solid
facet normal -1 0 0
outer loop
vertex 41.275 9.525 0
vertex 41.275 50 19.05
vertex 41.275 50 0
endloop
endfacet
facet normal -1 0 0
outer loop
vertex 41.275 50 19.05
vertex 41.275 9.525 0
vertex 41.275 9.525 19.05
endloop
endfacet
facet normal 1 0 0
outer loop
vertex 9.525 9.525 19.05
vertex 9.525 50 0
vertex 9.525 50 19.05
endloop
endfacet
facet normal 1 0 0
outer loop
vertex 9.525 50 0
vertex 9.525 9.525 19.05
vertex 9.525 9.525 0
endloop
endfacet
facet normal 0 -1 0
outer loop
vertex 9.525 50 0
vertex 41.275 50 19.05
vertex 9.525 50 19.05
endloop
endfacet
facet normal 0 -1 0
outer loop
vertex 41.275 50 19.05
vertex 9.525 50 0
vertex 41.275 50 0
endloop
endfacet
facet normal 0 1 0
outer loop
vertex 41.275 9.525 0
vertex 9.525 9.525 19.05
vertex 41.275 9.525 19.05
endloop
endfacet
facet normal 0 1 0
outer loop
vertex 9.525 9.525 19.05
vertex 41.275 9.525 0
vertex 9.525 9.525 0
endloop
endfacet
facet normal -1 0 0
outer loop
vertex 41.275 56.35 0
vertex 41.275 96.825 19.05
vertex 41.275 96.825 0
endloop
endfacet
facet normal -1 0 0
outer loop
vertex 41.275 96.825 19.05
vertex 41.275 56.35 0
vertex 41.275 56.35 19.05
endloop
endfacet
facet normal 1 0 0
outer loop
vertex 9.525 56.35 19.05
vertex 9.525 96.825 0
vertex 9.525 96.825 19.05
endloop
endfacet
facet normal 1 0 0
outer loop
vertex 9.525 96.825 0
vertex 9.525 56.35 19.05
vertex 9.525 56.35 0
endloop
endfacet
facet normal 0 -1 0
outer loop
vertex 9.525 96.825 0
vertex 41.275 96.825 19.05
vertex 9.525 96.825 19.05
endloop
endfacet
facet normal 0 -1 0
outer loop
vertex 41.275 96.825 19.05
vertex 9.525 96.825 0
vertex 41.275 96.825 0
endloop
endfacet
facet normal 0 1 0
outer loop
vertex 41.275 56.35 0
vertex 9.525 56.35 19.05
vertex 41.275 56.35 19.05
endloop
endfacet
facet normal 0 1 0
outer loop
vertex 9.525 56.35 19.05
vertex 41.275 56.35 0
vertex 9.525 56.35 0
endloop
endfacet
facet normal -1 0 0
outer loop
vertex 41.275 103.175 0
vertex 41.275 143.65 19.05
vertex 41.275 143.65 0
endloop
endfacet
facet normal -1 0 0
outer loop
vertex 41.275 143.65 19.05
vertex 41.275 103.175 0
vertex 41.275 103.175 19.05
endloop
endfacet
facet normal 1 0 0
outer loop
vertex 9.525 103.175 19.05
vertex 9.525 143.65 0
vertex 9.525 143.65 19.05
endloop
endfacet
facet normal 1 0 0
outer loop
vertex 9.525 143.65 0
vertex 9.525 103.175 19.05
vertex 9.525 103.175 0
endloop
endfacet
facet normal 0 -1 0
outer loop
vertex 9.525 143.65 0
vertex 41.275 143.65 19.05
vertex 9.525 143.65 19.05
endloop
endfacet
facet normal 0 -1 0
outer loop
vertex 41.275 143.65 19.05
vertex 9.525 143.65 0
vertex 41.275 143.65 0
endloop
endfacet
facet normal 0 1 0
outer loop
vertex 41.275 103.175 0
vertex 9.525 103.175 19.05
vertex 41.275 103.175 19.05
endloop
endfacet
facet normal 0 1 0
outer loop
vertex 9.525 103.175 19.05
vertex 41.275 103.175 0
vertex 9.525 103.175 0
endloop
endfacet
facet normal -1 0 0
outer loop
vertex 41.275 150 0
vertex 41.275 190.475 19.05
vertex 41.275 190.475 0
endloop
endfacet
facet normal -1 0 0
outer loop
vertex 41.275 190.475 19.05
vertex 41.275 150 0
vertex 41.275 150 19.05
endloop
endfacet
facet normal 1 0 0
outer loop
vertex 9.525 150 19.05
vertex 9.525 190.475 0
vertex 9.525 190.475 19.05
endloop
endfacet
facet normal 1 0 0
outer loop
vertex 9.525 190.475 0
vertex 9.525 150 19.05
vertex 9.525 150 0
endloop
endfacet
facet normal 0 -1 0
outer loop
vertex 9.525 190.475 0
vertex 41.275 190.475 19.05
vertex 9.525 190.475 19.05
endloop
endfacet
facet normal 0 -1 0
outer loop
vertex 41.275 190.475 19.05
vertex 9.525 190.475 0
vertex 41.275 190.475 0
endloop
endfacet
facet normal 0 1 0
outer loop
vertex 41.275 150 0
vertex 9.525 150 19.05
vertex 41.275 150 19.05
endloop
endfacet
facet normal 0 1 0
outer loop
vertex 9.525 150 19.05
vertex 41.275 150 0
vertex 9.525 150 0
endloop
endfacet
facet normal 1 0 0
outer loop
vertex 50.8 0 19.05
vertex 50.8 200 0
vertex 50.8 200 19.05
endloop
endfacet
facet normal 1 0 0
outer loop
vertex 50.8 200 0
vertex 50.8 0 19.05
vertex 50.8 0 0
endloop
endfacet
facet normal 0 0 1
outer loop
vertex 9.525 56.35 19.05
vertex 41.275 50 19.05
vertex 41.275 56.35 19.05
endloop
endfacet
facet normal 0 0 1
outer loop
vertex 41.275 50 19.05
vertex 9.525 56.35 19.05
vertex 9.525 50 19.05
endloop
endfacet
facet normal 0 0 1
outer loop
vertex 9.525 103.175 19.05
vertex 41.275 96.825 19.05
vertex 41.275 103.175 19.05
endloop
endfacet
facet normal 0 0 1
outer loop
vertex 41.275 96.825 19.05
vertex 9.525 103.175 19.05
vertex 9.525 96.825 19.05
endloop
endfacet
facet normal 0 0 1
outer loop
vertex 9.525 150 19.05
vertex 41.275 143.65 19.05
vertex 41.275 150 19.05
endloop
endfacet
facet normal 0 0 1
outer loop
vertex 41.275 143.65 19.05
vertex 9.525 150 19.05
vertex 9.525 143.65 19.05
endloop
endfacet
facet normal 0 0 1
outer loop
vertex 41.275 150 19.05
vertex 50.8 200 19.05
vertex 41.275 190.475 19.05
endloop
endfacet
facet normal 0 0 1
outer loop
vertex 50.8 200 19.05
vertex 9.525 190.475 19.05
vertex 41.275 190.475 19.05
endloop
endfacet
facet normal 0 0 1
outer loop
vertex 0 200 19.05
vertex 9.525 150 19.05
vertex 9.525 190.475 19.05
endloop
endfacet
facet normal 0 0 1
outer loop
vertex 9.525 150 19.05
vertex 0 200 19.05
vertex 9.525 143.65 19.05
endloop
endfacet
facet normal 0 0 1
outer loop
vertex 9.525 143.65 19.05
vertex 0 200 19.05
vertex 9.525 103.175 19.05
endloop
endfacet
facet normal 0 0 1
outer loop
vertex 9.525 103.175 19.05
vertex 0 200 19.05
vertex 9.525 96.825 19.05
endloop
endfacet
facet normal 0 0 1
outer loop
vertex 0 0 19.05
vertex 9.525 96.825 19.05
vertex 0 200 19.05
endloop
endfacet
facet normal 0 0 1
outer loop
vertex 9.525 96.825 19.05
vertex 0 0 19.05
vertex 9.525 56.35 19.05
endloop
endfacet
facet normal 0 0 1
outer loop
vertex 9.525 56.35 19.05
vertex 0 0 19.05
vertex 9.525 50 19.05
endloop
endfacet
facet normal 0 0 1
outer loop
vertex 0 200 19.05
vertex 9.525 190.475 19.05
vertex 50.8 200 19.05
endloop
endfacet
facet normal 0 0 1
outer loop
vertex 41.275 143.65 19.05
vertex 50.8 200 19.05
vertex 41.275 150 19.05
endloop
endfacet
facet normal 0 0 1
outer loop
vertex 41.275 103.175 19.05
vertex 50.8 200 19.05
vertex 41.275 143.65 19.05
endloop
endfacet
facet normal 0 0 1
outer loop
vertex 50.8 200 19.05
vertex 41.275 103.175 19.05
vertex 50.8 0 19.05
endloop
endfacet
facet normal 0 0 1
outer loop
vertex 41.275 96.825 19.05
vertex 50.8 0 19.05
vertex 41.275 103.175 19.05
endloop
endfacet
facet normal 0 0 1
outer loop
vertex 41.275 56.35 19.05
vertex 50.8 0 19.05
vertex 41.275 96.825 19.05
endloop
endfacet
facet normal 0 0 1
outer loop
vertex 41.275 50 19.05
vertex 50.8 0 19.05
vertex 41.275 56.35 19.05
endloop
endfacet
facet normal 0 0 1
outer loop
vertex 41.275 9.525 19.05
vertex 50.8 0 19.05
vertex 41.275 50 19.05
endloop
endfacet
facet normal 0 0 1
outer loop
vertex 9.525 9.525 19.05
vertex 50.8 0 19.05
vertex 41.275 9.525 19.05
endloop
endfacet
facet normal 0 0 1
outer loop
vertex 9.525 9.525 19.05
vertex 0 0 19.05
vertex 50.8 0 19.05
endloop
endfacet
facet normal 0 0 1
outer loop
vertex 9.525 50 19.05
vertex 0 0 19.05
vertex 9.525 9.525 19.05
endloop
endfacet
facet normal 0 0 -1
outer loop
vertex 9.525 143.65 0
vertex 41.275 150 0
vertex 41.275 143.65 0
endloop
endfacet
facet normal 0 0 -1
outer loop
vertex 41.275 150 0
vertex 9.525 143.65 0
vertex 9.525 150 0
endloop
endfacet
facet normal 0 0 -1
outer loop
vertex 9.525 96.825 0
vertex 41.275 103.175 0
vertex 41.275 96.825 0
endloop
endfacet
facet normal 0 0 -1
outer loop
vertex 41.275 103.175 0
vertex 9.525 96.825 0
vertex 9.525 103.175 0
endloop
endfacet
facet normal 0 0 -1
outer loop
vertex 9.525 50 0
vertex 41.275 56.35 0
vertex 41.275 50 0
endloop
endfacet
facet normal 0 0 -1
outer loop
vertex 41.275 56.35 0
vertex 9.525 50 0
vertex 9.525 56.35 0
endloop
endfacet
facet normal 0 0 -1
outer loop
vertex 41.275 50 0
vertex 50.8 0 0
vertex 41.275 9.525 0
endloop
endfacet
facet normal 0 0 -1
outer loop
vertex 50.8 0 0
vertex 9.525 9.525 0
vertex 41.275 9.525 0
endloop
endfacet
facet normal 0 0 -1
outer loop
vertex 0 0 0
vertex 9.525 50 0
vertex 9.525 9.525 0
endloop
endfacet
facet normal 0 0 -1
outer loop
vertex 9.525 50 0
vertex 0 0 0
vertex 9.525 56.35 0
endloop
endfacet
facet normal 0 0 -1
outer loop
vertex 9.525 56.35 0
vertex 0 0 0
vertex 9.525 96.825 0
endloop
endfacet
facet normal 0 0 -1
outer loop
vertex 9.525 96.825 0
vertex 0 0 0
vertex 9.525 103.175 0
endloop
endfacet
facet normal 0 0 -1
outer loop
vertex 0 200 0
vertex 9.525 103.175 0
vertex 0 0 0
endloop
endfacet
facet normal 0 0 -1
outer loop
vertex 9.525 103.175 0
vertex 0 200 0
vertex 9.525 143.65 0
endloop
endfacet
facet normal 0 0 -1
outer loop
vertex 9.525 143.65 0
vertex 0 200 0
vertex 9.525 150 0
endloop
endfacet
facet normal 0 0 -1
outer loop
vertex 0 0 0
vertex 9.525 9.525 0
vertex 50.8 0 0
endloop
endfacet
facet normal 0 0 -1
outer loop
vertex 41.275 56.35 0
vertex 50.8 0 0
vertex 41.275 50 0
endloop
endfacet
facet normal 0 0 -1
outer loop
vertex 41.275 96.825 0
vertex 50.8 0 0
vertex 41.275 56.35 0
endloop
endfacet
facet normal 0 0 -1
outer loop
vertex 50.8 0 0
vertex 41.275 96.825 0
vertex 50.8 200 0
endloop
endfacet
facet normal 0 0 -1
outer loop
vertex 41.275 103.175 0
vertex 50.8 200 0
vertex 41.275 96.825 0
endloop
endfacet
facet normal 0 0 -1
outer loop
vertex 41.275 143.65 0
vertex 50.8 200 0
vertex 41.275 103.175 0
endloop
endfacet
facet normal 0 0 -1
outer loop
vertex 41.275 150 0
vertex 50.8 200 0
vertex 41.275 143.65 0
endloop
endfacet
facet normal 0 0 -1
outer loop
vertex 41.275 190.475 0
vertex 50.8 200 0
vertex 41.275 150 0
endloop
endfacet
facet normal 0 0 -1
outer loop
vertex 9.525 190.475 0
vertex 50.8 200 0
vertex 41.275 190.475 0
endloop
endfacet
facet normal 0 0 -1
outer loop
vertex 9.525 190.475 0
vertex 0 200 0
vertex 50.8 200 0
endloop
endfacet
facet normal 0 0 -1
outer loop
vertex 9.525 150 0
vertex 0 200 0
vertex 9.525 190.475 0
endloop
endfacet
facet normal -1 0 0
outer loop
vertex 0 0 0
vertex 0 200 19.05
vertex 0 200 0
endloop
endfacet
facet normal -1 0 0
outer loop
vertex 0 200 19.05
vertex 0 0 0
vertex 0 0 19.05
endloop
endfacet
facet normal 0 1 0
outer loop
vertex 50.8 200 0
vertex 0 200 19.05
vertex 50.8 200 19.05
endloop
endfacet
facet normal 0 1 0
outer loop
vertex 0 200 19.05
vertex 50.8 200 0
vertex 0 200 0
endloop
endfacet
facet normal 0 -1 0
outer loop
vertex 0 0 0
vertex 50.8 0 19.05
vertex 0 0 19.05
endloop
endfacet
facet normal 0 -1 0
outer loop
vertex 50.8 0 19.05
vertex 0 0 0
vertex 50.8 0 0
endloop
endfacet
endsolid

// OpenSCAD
// =============================================================================
// Heavy-Duty Parametric Fence Spacer with Internal Ribs
// Parametric inch conventions matching x-degree-clamping-triangle.scad
// =============================================================================

$fn = 128;
inch = 25.4;

// -----------------------------------------------------------------------------
// USER PARAMETERS (Specified in inches or mm using * inch)
// -----------------------------------------------------------------------------
outer_x       = 2.0 * inch;       // Width (~38.1mm nominal 1x2, or 2.0 * inch actual)
outer_y       = 200.0;            // Length along fence (matches 200mm triangle base)
outer_z       = 3/4 * inch;       // Height / thickness (matches 3/4" clamping triangle)

border        = 3/8 * inch;       // Perimeter wall thickness (~9.5mm)
rib_thickness = 1/4 * inch;       // Internal dividing rib thickness (~6.35mm)
num_openings  = 4;                // Number of divided rectangular openings

// -----------------------------------------------------------------------------
// GEOMETRY CALCULATIONS
// -----------------------------------------------------------------------------
inner_x           = outer_x - (2 * border);
total_open_span_y = outer_y - (2 * border);
total_ribs_y      = (num_openings - 1) * rib_thickness;
cutout_y          = (total_open_span_y - total_ribs_y) / num_openings;

// -----------------------------------------------------------------------------
// MAIN MODEL
// -----------------------------------------------------------------------------
difference() {
    // Outer solid block
    cube([outer_x, outer_y, outer_z]);

    // Evenly spaced through-openings
    for (i = [0 : num_openings - 1]) {
        y_pos = border + i * (cutout_y + rib_thickness);
        translate([border, y_pos, -1])
            cube([inner_x, cutout_y, outer_z + 2]);
    }
}
